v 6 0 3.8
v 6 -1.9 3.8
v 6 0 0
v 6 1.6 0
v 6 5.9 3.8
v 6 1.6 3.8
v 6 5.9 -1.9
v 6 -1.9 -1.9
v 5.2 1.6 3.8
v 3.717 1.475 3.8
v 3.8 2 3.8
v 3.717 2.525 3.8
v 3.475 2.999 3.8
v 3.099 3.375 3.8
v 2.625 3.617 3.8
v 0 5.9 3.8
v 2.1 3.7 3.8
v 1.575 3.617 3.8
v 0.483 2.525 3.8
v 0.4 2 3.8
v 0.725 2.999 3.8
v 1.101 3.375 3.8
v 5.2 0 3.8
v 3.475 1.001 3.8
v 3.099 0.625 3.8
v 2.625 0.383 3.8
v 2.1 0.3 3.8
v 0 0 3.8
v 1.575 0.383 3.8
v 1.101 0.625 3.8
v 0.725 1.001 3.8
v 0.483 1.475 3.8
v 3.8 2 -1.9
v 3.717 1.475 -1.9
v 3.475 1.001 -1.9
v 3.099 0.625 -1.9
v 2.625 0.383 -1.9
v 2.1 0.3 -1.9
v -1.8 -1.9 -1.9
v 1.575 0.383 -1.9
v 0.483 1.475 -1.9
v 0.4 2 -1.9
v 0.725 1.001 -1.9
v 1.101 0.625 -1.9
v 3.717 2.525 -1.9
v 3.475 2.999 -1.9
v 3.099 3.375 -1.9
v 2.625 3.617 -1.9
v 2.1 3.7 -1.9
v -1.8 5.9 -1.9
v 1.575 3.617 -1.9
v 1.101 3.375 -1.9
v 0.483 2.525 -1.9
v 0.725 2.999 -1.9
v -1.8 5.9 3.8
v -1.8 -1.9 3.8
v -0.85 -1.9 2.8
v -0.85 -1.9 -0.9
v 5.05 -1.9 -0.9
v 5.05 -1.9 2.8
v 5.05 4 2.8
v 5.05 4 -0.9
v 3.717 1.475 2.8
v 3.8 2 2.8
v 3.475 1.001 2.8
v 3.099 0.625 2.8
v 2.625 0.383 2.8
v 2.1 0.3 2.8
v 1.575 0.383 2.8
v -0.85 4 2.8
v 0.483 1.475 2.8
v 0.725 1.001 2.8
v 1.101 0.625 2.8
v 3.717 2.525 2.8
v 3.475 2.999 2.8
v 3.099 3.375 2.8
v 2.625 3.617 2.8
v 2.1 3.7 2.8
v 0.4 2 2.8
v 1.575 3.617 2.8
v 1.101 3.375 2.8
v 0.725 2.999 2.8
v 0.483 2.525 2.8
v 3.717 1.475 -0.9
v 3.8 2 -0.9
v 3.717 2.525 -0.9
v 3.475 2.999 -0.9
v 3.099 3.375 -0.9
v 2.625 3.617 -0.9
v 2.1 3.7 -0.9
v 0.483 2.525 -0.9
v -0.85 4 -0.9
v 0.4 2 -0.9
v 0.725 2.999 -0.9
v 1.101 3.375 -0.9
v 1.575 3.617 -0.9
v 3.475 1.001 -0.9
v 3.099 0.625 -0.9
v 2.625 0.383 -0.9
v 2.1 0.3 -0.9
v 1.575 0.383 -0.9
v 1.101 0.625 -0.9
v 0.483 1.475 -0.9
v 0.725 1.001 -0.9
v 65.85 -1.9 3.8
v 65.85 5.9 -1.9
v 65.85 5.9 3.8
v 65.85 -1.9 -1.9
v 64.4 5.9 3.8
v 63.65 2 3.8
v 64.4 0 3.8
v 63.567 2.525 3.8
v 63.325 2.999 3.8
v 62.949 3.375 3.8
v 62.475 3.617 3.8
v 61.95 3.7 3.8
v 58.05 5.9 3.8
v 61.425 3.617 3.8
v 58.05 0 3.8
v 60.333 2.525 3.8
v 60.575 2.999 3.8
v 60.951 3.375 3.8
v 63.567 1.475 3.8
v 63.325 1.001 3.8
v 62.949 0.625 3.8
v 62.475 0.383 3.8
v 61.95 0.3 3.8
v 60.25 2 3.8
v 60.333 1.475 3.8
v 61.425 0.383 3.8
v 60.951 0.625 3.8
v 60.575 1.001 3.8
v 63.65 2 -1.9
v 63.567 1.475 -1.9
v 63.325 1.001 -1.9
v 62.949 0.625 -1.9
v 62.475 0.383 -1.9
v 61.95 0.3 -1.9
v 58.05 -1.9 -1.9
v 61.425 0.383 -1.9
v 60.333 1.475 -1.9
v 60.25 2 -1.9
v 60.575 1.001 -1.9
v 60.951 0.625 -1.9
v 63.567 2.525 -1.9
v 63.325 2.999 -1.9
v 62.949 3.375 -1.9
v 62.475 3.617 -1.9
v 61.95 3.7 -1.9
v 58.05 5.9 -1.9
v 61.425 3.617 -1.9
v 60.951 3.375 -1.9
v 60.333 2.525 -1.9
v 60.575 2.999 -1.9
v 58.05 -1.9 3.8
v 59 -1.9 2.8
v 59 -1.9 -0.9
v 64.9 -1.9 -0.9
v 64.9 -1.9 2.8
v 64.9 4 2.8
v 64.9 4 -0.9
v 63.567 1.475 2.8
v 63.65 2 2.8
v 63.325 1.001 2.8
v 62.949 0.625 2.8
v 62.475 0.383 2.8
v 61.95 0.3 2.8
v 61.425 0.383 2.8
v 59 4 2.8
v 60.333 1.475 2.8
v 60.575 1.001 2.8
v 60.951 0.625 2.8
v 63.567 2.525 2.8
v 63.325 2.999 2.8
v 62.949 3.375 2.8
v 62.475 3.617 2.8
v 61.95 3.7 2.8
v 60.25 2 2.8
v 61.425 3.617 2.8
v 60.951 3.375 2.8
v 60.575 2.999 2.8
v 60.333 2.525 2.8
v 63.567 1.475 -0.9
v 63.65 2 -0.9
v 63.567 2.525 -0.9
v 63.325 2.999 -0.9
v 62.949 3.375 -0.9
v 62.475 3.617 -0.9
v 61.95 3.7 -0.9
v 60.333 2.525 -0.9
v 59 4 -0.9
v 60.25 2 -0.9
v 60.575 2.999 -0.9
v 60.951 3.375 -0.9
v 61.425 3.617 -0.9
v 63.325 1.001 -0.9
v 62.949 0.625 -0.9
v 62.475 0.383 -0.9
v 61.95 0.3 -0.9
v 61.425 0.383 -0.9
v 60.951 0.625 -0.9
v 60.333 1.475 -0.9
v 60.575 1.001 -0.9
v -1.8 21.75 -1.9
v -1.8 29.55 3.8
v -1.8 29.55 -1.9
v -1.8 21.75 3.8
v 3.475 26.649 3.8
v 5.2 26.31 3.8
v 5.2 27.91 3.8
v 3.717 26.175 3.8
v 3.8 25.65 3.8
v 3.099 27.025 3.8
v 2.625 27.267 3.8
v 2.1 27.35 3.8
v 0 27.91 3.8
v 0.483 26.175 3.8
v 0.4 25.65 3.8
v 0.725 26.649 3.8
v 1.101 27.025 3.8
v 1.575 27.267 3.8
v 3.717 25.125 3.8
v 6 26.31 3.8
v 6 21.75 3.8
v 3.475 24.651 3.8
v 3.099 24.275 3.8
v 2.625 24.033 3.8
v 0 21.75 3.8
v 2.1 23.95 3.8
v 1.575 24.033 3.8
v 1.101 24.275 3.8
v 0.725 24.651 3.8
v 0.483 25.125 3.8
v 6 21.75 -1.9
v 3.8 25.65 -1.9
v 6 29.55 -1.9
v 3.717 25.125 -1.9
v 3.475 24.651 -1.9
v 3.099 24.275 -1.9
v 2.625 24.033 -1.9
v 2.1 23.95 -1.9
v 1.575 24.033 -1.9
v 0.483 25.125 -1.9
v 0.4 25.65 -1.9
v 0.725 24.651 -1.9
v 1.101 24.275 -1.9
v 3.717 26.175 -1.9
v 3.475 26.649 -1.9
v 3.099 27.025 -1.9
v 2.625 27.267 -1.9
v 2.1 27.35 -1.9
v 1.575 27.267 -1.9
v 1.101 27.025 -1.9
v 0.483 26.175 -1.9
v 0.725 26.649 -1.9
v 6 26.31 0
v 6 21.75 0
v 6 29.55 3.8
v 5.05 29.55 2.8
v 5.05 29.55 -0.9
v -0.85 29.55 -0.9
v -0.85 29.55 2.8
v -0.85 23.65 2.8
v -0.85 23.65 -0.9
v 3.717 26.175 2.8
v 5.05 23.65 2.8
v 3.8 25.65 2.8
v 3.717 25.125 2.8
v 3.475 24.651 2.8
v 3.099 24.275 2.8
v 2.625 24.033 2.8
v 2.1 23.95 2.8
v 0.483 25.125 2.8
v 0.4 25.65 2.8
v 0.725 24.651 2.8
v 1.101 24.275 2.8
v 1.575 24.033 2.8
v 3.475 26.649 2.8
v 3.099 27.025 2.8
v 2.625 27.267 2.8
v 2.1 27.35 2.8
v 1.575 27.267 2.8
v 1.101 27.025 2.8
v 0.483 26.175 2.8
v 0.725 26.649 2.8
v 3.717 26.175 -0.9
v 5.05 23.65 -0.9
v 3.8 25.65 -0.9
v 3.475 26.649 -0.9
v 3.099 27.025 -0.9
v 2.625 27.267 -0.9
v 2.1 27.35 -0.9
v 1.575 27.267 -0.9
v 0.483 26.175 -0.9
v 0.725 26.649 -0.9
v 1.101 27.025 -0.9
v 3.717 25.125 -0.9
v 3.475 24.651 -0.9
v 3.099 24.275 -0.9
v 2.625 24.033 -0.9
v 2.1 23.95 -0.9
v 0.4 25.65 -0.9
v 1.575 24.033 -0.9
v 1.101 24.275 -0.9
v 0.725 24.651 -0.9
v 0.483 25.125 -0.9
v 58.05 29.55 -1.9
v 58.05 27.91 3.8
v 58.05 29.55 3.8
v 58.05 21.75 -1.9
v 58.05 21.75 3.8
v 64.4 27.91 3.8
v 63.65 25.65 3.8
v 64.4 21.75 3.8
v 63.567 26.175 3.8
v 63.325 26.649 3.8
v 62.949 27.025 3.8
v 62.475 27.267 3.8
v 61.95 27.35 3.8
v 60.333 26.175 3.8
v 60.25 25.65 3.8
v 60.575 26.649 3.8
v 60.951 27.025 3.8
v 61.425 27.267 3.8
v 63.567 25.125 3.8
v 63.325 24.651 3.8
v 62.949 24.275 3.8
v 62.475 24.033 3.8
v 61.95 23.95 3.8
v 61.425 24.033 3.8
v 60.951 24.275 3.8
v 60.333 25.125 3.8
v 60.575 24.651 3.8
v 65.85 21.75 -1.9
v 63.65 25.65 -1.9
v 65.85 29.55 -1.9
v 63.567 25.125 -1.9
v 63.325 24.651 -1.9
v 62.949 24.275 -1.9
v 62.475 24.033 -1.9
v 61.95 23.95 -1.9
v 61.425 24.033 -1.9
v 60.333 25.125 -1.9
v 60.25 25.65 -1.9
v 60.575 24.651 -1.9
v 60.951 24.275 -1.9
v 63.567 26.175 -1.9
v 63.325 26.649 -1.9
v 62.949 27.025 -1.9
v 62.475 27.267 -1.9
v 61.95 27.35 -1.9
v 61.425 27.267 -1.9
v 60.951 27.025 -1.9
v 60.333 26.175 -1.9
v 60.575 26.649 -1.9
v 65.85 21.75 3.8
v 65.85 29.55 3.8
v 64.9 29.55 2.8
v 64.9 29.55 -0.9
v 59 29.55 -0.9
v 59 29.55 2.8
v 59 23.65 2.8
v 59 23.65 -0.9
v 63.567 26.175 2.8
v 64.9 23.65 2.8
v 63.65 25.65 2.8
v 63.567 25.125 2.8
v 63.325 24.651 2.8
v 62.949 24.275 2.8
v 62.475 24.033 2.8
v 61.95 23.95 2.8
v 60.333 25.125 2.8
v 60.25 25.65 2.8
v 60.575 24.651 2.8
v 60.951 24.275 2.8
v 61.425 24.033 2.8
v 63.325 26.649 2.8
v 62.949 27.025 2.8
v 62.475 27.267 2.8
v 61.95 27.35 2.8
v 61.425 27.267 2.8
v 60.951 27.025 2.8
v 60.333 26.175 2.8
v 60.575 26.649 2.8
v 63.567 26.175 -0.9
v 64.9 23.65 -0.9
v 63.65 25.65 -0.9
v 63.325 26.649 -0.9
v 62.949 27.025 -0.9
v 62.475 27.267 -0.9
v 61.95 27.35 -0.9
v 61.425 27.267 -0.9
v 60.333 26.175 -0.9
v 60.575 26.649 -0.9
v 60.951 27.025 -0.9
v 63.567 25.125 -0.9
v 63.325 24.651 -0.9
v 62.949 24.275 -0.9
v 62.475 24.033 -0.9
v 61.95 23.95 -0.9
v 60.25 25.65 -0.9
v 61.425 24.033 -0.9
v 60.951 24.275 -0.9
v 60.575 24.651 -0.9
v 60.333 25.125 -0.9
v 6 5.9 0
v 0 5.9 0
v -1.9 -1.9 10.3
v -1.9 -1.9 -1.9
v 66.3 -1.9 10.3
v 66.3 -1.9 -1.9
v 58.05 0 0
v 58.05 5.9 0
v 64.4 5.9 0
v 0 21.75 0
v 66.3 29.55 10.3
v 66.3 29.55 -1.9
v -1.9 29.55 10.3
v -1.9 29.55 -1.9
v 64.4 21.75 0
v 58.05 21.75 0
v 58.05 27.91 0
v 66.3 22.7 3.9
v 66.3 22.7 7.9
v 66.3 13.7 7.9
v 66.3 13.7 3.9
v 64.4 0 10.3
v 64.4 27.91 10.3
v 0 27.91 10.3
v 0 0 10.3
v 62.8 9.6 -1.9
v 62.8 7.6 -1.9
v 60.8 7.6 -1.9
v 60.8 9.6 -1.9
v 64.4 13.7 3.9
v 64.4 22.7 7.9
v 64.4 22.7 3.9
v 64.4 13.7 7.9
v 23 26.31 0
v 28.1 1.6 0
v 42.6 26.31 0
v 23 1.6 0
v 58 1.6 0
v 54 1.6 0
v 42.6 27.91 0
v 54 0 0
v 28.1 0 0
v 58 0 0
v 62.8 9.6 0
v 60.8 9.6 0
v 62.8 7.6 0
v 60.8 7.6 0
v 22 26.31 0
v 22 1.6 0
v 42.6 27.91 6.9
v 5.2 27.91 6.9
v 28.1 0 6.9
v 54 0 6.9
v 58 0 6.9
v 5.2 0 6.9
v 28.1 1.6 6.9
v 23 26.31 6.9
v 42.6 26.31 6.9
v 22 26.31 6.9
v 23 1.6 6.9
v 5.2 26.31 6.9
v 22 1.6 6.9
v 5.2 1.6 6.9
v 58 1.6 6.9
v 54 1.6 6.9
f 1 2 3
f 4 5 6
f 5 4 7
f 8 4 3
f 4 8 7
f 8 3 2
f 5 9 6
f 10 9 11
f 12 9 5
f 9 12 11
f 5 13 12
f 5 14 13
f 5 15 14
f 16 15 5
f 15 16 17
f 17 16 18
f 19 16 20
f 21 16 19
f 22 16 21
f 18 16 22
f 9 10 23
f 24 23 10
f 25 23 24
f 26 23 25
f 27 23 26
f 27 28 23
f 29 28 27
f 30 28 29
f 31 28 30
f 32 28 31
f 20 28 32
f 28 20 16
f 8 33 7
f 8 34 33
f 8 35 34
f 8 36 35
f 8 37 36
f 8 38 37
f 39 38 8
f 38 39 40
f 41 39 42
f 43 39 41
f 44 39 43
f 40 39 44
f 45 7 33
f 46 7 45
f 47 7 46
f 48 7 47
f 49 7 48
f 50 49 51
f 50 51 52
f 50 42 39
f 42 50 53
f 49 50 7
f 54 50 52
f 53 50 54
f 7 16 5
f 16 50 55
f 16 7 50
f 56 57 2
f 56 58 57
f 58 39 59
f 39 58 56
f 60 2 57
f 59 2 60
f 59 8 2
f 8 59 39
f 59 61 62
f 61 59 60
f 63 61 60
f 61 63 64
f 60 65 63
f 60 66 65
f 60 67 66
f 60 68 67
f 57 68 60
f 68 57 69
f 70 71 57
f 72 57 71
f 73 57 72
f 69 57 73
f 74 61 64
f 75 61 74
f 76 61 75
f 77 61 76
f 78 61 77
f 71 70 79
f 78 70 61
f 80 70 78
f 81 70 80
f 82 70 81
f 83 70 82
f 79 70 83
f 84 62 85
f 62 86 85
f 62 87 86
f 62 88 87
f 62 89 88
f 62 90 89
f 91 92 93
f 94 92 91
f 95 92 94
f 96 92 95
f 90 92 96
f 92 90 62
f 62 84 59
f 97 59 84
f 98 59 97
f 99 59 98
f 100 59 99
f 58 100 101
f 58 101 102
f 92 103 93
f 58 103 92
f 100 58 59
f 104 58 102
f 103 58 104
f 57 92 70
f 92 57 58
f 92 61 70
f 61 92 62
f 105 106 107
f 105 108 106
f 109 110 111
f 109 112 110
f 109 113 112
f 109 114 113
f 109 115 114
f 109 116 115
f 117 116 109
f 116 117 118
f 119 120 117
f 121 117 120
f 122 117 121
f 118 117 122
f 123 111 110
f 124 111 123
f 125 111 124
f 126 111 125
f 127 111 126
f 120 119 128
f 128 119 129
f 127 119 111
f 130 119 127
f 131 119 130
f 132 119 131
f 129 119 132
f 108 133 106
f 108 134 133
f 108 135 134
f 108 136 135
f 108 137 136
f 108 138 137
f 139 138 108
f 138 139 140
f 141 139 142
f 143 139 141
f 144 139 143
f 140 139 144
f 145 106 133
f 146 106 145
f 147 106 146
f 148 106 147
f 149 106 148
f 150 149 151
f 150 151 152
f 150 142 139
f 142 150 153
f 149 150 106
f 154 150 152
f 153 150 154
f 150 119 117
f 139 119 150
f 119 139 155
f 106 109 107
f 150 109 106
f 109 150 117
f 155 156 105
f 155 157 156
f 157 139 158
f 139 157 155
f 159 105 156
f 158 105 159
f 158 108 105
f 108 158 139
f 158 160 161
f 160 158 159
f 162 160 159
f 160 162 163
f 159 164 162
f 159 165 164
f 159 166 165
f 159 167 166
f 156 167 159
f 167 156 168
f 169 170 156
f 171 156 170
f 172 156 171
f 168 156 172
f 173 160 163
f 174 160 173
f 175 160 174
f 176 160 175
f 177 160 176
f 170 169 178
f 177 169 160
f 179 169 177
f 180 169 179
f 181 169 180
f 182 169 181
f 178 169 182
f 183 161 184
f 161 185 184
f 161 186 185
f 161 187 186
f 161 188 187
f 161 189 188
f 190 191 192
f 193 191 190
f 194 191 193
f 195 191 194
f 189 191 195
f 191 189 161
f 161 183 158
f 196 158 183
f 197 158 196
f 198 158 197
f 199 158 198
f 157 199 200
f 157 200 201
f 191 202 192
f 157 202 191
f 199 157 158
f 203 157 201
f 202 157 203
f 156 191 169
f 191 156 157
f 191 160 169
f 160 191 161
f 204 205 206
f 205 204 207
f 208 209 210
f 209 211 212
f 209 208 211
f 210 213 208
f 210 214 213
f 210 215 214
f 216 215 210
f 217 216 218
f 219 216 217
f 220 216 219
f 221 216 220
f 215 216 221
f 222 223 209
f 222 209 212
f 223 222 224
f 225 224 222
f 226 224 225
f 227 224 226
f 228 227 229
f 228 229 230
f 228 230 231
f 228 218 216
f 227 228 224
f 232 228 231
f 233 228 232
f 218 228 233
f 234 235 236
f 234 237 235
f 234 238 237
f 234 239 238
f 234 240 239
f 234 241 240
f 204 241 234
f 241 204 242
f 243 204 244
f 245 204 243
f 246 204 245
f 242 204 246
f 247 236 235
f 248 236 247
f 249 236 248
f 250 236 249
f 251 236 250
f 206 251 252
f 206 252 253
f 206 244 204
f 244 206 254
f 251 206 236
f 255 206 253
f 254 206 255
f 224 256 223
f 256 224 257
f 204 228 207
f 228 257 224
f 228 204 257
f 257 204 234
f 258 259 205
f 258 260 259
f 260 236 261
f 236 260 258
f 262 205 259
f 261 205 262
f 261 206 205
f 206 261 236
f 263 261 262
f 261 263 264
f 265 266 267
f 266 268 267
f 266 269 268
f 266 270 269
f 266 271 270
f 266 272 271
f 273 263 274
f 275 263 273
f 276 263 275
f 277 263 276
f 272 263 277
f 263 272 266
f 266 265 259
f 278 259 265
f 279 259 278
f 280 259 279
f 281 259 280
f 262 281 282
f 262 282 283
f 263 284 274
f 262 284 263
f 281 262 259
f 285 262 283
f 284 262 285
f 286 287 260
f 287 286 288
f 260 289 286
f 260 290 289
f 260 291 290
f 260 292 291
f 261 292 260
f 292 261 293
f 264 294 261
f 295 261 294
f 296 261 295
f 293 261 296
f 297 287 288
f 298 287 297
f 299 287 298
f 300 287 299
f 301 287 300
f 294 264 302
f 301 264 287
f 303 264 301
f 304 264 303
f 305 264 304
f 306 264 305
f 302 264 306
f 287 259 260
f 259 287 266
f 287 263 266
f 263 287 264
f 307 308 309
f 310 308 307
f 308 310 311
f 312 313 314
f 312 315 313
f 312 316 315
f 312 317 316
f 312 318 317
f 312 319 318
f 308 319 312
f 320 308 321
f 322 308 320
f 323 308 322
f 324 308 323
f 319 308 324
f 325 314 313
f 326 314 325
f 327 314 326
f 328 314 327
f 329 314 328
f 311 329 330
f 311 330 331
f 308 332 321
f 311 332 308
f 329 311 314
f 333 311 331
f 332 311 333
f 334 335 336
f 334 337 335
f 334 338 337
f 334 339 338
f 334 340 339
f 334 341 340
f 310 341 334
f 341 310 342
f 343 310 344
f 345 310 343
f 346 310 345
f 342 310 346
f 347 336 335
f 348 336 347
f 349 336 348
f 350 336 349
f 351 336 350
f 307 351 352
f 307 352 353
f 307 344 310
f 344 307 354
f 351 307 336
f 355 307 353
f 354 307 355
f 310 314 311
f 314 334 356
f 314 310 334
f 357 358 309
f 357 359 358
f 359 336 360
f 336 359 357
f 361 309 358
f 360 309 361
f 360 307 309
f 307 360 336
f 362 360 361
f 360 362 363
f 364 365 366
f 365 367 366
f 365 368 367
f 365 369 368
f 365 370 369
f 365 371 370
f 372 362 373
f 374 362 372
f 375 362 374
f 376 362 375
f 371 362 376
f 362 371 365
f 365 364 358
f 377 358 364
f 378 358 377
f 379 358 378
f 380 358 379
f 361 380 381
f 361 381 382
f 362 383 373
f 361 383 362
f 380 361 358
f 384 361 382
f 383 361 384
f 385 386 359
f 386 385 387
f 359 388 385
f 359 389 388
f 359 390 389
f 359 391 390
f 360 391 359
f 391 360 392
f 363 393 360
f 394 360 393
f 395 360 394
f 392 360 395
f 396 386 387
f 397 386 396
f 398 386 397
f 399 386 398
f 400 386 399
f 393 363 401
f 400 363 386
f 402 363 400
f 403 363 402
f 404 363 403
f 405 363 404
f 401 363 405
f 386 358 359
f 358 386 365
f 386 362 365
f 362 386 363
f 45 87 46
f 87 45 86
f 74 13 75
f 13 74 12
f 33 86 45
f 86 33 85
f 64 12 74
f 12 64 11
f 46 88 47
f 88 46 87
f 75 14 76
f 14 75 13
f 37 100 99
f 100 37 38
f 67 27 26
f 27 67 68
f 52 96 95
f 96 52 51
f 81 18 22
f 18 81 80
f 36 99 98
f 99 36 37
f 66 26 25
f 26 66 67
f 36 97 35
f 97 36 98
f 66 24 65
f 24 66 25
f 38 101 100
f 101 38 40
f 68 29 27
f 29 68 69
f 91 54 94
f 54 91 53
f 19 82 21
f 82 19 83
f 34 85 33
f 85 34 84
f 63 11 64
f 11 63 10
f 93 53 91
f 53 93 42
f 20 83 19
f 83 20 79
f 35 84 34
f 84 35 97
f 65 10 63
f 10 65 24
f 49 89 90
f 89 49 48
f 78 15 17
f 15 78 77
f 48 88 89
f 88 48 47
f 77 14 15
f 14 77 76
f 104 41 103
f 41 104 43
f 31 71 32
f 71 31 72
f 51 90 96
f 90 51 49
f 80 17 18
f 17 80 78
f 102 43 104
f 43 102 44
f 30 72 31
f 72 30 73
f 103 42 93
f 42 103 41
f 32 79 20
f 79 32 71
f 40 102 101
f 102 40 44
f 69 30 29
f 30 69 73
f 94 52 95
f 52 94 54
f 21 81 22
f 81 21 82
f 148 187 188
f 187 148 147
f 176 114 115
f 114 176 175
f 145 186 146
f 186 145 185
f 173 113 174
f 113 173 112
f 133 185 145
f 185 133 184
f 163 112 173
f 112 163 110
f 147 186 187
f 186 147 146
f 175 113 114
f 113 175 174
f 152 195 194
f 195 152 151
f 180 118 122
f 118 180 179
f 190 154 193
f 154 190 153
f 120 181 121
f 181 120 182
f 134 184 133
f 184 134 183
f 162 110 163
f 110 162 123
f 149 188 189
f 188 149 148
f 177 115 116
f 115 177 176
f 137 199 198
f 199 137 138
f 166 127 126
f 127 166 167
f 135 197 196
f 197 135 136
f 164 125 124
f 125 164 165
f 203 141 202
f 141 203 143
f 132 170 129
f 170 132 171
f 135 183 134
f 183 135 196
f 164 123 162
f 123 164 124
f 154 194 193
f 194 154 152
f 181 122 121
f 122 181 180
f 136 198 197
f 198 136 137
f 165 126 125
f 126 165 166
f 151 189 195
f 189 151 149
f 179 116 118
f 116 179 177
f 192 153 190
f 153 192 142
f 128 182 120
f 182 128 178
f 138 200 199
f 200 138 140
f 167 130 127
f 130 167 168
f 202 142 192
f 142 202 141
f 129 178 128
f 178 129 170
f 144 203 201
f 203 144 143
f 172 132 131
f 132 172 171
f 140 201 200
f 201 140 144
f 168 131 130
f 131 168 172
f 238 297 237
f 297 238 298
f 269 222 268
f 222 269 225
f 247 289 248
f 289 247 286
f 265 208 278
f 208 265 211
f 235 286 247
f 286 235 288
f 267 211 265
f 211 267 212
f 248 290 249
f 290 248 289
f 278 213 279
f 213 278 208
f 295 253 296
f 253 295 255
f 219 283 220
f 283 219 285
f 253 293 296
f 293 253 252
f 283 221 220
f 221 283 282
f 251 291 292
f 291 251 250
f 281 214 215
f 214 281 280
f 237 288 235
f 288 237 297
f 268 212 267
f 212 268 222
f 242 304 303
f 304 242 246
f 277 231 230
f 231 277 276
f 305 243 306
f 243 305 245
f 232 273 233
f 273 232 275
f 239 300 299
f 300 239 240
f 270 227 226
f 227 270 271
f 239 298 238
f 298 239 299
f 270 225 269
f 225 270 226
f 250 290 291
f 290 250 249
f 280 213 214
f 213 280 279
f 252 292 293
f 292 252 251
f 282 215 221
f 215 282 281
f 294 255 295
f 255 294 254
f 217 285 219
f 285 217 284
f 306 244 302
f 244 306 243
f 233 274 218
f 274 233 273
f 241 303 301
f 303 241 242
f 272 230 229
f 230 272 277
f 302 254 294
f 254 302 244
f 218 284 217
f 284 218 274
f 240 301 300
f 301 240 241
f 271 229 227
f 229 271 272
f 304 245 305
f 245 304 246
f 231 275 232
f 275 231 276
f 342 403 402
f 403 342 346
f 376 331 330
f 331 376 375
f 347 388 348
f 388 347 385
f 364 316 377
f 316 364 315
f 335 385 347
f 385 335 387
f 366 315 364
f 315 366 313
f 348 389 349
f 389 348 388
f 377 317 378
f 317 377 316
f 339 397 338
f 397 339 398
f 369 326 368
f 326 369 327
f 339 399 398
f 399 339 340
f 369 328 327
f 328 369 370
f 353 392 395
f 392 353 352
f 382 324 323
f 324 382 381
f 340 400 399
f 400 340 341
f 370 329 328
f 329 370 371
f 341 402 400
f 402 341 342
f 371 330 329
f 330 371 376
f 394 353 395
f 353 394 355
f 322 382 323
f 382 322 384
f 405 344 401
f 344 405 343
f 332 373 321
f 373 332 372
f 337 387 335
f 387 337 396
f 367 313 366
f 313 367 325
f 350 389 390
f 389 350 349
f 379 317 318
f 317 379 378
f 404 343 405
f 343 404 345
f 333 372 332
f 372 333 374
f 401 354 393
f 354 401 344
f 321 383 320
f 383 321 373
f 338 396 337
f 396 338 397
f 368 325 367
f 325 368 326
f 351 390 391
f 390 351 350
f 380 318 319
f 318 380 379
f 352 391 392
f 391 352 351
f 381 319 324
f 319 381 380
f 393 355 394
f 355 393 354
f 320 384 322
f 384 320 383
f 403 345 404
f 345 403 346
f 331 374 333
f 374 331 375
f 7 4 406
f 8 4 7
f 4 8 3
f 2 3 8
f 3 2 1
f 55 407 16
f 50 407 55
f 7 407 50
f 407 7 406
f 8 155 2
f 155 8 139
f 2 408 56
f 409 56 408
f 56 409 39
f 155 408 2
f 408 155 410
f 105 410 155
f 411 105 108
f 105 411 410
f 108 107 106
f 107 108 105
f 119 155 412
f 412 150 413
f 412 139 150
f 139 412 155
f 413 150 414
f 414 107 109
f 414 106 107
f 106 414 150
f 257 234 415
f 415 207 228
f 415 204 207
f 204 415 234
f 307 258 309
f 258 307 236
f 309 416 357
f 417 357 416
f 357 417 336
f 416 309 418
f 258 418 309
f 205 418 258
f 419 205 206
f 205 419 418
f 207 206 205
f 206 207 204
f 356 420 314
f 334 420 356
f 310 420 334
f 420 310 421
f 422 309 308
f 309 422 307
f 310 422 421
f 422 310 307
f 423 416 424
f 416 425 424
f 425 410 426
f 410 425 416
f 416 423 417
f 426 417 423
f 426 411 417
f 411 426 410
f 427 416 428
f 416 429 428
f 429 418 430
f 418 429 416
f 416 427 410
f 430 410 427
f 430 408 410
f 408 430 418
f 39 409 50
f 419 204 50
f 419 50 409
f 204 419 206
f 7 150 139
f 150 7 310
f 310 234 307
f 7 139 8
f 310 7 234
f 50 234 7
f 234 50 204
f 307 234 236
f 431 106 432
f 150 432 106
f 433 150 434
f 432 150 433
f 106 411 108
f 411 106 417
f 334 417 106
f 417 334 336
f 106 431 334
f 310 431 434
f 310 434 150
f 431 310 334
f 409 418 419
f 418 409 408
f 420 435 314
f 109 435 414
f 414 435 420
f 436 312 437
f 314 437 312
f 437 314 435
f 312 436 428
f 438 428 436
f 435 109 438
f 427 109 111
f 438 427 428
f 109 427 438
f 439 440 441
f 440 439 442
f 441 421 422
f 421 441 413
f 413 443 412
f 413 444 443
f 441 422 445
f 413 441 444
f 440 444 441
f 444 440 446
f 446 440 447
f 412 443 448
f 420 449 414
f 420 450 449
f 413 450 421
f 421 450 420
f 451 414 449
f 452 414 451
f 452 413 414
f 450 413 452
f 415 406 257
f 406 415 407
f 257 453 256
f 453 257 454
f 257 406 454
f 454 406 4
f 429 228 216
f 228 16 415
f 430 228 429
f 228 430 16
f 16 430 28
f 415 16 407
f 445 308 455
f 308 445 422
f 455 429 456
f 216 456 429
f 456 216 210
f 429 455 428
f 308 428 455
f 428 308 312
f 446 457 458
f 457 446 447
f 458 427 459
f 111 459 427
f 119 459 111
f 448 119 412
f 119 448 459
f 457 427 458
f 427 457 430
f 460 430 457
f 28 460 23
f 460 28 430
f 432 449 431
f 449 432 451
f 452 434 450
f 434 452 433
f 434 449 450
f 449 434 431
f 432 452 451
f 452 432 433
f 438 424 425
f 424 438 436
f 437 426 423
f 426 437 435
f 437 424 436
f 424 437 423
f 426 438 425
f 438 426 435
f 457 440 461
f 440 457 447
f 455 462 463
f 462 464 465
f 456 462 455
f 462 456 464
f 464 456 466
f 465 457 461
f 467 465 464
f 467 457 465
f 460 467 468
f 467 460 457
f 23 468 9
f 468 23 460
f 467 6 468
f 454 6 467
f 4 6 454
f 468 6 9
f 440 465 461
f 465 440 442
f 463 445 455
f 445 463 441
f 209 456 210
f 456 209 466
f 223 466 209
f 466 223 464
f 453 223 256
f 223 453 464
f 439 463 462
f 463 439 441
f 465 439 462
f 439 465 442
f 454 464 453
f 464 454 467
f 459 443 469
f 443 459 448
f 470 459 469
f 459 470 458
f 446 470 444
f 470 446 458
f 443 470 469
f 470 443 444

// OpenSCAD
wall_thickness = 1.9;

// Related to the "nut slot" posts
nut_width = 5.5;
nut_height = 2.5;
nut_post_width = nut_width + 2.3;
nut_hole_height = nut_height + 1.2;
nut_hole_width = nut_width + 0.4;

nut_hole_depth = (nut_post_width-nut_width)/2 + nut_width;

nut_post_height = nut_hole_height + 2;




// The actual case interior
pcb_width = 64.2+0.2;
pcb_depth = 27.41+0.5;

post_offset_x = 59.6+0.25;
post_offset_y = 23.4+0.25;
//interior_standoff = 2.9+nut_post_height;
interior_standoff = 1.2+nut_post_height;

main_case_height = interior_standoff + 3.4; // The external height of the case 


module make_nut_post(holes=true) {
    translate([-nut_post_width/2, -nut_post_width/2,0])
    difference () {
        // The actual post
        cube([nut_post_width, nut_post_width, nut_post_height]);
        if(holes) {
            // The hole for the nut
            translate([(nut_post_width-nut_hole_width)/2, -wall_thickness, (nut_post_height-nut_hole_height)/2]) cube([nut_hole_width, nut_post_width, nut_hole_height]);
        }
    }    
}


module make_nut_posts(holes=true) {
    translate([2.1,2,-wall_thickness]) {
        translate([0, 0, 0]) make_nut_post(holes);
        translate([post_offset_x, 0, 0]) make_nut_post(holes);
        translate([0, post_offset_y, 0]) rotate([0,0,180]) make_nut_post(holes);
        translate([post_offset_x, post_offset_y, 0]) rotate([0,0,180]) make_nut_post(holes);
    }
}


module make_holes() {
    post_height = main_case_height*2;
    hole_radius = 1.7;
    translate([0, 0, 0]) cylinder($fn=20, r=hole_radius,h=post_height);
    translate([post_offset_x, 0, 0]) cylinder($fn=20, r=hole_radius,h=post_height);
    translate([0, post_offset_y, 0]) cylinder($fn=20, r=hole_radius,h=post_height);
    translate([post_offset_x, post_offset_y, 0]) cylinder($fn=20, r=hole_radius,h=post_height);
}

difference() {
    make_nut_posts();
    translate([2.1,2,-wall_thickness-0.1]) make_holes();
}

difference () {
    translate([-wall_thickness,-wall_thickness,-wall_thickness]) cube([pcb_width+(wall_thickness*2),pcb_depth+(wall_thickness*2)-0.26,main_case_height+wall_thickness]);
    cube([pcb_width,pcb_depth,main_case_height+wall_thickness]);
    // The screw holes
    translate([2.1,2,-wall_thickness-0.1]) make_holes();
    // Boot switch hole
    translate([pcb_width-1.6-2,7.6,-wall_thickness-0.1]) cube([2,2,7+wall_thickness]);
    // microUSB hole
    translate([pcb_width-0.1,13.7,interior_standoff-3]) cube([wall_thickness+0.2,9,4]);
    
    #make_nut_posts(false);
    
}

translate([5.2,0,0]) cube([22.9, 1.6, interior_standoff]);
translate([5.2,pcb_depth-1.6,0]) cube([37.4, 1.6, interior_standoff]);
translate([22,0,0]) cube([1,pcb_depth,interior_standoff]);
translate([54,0,0]) cube([4,1.6,interior_standoff]);
